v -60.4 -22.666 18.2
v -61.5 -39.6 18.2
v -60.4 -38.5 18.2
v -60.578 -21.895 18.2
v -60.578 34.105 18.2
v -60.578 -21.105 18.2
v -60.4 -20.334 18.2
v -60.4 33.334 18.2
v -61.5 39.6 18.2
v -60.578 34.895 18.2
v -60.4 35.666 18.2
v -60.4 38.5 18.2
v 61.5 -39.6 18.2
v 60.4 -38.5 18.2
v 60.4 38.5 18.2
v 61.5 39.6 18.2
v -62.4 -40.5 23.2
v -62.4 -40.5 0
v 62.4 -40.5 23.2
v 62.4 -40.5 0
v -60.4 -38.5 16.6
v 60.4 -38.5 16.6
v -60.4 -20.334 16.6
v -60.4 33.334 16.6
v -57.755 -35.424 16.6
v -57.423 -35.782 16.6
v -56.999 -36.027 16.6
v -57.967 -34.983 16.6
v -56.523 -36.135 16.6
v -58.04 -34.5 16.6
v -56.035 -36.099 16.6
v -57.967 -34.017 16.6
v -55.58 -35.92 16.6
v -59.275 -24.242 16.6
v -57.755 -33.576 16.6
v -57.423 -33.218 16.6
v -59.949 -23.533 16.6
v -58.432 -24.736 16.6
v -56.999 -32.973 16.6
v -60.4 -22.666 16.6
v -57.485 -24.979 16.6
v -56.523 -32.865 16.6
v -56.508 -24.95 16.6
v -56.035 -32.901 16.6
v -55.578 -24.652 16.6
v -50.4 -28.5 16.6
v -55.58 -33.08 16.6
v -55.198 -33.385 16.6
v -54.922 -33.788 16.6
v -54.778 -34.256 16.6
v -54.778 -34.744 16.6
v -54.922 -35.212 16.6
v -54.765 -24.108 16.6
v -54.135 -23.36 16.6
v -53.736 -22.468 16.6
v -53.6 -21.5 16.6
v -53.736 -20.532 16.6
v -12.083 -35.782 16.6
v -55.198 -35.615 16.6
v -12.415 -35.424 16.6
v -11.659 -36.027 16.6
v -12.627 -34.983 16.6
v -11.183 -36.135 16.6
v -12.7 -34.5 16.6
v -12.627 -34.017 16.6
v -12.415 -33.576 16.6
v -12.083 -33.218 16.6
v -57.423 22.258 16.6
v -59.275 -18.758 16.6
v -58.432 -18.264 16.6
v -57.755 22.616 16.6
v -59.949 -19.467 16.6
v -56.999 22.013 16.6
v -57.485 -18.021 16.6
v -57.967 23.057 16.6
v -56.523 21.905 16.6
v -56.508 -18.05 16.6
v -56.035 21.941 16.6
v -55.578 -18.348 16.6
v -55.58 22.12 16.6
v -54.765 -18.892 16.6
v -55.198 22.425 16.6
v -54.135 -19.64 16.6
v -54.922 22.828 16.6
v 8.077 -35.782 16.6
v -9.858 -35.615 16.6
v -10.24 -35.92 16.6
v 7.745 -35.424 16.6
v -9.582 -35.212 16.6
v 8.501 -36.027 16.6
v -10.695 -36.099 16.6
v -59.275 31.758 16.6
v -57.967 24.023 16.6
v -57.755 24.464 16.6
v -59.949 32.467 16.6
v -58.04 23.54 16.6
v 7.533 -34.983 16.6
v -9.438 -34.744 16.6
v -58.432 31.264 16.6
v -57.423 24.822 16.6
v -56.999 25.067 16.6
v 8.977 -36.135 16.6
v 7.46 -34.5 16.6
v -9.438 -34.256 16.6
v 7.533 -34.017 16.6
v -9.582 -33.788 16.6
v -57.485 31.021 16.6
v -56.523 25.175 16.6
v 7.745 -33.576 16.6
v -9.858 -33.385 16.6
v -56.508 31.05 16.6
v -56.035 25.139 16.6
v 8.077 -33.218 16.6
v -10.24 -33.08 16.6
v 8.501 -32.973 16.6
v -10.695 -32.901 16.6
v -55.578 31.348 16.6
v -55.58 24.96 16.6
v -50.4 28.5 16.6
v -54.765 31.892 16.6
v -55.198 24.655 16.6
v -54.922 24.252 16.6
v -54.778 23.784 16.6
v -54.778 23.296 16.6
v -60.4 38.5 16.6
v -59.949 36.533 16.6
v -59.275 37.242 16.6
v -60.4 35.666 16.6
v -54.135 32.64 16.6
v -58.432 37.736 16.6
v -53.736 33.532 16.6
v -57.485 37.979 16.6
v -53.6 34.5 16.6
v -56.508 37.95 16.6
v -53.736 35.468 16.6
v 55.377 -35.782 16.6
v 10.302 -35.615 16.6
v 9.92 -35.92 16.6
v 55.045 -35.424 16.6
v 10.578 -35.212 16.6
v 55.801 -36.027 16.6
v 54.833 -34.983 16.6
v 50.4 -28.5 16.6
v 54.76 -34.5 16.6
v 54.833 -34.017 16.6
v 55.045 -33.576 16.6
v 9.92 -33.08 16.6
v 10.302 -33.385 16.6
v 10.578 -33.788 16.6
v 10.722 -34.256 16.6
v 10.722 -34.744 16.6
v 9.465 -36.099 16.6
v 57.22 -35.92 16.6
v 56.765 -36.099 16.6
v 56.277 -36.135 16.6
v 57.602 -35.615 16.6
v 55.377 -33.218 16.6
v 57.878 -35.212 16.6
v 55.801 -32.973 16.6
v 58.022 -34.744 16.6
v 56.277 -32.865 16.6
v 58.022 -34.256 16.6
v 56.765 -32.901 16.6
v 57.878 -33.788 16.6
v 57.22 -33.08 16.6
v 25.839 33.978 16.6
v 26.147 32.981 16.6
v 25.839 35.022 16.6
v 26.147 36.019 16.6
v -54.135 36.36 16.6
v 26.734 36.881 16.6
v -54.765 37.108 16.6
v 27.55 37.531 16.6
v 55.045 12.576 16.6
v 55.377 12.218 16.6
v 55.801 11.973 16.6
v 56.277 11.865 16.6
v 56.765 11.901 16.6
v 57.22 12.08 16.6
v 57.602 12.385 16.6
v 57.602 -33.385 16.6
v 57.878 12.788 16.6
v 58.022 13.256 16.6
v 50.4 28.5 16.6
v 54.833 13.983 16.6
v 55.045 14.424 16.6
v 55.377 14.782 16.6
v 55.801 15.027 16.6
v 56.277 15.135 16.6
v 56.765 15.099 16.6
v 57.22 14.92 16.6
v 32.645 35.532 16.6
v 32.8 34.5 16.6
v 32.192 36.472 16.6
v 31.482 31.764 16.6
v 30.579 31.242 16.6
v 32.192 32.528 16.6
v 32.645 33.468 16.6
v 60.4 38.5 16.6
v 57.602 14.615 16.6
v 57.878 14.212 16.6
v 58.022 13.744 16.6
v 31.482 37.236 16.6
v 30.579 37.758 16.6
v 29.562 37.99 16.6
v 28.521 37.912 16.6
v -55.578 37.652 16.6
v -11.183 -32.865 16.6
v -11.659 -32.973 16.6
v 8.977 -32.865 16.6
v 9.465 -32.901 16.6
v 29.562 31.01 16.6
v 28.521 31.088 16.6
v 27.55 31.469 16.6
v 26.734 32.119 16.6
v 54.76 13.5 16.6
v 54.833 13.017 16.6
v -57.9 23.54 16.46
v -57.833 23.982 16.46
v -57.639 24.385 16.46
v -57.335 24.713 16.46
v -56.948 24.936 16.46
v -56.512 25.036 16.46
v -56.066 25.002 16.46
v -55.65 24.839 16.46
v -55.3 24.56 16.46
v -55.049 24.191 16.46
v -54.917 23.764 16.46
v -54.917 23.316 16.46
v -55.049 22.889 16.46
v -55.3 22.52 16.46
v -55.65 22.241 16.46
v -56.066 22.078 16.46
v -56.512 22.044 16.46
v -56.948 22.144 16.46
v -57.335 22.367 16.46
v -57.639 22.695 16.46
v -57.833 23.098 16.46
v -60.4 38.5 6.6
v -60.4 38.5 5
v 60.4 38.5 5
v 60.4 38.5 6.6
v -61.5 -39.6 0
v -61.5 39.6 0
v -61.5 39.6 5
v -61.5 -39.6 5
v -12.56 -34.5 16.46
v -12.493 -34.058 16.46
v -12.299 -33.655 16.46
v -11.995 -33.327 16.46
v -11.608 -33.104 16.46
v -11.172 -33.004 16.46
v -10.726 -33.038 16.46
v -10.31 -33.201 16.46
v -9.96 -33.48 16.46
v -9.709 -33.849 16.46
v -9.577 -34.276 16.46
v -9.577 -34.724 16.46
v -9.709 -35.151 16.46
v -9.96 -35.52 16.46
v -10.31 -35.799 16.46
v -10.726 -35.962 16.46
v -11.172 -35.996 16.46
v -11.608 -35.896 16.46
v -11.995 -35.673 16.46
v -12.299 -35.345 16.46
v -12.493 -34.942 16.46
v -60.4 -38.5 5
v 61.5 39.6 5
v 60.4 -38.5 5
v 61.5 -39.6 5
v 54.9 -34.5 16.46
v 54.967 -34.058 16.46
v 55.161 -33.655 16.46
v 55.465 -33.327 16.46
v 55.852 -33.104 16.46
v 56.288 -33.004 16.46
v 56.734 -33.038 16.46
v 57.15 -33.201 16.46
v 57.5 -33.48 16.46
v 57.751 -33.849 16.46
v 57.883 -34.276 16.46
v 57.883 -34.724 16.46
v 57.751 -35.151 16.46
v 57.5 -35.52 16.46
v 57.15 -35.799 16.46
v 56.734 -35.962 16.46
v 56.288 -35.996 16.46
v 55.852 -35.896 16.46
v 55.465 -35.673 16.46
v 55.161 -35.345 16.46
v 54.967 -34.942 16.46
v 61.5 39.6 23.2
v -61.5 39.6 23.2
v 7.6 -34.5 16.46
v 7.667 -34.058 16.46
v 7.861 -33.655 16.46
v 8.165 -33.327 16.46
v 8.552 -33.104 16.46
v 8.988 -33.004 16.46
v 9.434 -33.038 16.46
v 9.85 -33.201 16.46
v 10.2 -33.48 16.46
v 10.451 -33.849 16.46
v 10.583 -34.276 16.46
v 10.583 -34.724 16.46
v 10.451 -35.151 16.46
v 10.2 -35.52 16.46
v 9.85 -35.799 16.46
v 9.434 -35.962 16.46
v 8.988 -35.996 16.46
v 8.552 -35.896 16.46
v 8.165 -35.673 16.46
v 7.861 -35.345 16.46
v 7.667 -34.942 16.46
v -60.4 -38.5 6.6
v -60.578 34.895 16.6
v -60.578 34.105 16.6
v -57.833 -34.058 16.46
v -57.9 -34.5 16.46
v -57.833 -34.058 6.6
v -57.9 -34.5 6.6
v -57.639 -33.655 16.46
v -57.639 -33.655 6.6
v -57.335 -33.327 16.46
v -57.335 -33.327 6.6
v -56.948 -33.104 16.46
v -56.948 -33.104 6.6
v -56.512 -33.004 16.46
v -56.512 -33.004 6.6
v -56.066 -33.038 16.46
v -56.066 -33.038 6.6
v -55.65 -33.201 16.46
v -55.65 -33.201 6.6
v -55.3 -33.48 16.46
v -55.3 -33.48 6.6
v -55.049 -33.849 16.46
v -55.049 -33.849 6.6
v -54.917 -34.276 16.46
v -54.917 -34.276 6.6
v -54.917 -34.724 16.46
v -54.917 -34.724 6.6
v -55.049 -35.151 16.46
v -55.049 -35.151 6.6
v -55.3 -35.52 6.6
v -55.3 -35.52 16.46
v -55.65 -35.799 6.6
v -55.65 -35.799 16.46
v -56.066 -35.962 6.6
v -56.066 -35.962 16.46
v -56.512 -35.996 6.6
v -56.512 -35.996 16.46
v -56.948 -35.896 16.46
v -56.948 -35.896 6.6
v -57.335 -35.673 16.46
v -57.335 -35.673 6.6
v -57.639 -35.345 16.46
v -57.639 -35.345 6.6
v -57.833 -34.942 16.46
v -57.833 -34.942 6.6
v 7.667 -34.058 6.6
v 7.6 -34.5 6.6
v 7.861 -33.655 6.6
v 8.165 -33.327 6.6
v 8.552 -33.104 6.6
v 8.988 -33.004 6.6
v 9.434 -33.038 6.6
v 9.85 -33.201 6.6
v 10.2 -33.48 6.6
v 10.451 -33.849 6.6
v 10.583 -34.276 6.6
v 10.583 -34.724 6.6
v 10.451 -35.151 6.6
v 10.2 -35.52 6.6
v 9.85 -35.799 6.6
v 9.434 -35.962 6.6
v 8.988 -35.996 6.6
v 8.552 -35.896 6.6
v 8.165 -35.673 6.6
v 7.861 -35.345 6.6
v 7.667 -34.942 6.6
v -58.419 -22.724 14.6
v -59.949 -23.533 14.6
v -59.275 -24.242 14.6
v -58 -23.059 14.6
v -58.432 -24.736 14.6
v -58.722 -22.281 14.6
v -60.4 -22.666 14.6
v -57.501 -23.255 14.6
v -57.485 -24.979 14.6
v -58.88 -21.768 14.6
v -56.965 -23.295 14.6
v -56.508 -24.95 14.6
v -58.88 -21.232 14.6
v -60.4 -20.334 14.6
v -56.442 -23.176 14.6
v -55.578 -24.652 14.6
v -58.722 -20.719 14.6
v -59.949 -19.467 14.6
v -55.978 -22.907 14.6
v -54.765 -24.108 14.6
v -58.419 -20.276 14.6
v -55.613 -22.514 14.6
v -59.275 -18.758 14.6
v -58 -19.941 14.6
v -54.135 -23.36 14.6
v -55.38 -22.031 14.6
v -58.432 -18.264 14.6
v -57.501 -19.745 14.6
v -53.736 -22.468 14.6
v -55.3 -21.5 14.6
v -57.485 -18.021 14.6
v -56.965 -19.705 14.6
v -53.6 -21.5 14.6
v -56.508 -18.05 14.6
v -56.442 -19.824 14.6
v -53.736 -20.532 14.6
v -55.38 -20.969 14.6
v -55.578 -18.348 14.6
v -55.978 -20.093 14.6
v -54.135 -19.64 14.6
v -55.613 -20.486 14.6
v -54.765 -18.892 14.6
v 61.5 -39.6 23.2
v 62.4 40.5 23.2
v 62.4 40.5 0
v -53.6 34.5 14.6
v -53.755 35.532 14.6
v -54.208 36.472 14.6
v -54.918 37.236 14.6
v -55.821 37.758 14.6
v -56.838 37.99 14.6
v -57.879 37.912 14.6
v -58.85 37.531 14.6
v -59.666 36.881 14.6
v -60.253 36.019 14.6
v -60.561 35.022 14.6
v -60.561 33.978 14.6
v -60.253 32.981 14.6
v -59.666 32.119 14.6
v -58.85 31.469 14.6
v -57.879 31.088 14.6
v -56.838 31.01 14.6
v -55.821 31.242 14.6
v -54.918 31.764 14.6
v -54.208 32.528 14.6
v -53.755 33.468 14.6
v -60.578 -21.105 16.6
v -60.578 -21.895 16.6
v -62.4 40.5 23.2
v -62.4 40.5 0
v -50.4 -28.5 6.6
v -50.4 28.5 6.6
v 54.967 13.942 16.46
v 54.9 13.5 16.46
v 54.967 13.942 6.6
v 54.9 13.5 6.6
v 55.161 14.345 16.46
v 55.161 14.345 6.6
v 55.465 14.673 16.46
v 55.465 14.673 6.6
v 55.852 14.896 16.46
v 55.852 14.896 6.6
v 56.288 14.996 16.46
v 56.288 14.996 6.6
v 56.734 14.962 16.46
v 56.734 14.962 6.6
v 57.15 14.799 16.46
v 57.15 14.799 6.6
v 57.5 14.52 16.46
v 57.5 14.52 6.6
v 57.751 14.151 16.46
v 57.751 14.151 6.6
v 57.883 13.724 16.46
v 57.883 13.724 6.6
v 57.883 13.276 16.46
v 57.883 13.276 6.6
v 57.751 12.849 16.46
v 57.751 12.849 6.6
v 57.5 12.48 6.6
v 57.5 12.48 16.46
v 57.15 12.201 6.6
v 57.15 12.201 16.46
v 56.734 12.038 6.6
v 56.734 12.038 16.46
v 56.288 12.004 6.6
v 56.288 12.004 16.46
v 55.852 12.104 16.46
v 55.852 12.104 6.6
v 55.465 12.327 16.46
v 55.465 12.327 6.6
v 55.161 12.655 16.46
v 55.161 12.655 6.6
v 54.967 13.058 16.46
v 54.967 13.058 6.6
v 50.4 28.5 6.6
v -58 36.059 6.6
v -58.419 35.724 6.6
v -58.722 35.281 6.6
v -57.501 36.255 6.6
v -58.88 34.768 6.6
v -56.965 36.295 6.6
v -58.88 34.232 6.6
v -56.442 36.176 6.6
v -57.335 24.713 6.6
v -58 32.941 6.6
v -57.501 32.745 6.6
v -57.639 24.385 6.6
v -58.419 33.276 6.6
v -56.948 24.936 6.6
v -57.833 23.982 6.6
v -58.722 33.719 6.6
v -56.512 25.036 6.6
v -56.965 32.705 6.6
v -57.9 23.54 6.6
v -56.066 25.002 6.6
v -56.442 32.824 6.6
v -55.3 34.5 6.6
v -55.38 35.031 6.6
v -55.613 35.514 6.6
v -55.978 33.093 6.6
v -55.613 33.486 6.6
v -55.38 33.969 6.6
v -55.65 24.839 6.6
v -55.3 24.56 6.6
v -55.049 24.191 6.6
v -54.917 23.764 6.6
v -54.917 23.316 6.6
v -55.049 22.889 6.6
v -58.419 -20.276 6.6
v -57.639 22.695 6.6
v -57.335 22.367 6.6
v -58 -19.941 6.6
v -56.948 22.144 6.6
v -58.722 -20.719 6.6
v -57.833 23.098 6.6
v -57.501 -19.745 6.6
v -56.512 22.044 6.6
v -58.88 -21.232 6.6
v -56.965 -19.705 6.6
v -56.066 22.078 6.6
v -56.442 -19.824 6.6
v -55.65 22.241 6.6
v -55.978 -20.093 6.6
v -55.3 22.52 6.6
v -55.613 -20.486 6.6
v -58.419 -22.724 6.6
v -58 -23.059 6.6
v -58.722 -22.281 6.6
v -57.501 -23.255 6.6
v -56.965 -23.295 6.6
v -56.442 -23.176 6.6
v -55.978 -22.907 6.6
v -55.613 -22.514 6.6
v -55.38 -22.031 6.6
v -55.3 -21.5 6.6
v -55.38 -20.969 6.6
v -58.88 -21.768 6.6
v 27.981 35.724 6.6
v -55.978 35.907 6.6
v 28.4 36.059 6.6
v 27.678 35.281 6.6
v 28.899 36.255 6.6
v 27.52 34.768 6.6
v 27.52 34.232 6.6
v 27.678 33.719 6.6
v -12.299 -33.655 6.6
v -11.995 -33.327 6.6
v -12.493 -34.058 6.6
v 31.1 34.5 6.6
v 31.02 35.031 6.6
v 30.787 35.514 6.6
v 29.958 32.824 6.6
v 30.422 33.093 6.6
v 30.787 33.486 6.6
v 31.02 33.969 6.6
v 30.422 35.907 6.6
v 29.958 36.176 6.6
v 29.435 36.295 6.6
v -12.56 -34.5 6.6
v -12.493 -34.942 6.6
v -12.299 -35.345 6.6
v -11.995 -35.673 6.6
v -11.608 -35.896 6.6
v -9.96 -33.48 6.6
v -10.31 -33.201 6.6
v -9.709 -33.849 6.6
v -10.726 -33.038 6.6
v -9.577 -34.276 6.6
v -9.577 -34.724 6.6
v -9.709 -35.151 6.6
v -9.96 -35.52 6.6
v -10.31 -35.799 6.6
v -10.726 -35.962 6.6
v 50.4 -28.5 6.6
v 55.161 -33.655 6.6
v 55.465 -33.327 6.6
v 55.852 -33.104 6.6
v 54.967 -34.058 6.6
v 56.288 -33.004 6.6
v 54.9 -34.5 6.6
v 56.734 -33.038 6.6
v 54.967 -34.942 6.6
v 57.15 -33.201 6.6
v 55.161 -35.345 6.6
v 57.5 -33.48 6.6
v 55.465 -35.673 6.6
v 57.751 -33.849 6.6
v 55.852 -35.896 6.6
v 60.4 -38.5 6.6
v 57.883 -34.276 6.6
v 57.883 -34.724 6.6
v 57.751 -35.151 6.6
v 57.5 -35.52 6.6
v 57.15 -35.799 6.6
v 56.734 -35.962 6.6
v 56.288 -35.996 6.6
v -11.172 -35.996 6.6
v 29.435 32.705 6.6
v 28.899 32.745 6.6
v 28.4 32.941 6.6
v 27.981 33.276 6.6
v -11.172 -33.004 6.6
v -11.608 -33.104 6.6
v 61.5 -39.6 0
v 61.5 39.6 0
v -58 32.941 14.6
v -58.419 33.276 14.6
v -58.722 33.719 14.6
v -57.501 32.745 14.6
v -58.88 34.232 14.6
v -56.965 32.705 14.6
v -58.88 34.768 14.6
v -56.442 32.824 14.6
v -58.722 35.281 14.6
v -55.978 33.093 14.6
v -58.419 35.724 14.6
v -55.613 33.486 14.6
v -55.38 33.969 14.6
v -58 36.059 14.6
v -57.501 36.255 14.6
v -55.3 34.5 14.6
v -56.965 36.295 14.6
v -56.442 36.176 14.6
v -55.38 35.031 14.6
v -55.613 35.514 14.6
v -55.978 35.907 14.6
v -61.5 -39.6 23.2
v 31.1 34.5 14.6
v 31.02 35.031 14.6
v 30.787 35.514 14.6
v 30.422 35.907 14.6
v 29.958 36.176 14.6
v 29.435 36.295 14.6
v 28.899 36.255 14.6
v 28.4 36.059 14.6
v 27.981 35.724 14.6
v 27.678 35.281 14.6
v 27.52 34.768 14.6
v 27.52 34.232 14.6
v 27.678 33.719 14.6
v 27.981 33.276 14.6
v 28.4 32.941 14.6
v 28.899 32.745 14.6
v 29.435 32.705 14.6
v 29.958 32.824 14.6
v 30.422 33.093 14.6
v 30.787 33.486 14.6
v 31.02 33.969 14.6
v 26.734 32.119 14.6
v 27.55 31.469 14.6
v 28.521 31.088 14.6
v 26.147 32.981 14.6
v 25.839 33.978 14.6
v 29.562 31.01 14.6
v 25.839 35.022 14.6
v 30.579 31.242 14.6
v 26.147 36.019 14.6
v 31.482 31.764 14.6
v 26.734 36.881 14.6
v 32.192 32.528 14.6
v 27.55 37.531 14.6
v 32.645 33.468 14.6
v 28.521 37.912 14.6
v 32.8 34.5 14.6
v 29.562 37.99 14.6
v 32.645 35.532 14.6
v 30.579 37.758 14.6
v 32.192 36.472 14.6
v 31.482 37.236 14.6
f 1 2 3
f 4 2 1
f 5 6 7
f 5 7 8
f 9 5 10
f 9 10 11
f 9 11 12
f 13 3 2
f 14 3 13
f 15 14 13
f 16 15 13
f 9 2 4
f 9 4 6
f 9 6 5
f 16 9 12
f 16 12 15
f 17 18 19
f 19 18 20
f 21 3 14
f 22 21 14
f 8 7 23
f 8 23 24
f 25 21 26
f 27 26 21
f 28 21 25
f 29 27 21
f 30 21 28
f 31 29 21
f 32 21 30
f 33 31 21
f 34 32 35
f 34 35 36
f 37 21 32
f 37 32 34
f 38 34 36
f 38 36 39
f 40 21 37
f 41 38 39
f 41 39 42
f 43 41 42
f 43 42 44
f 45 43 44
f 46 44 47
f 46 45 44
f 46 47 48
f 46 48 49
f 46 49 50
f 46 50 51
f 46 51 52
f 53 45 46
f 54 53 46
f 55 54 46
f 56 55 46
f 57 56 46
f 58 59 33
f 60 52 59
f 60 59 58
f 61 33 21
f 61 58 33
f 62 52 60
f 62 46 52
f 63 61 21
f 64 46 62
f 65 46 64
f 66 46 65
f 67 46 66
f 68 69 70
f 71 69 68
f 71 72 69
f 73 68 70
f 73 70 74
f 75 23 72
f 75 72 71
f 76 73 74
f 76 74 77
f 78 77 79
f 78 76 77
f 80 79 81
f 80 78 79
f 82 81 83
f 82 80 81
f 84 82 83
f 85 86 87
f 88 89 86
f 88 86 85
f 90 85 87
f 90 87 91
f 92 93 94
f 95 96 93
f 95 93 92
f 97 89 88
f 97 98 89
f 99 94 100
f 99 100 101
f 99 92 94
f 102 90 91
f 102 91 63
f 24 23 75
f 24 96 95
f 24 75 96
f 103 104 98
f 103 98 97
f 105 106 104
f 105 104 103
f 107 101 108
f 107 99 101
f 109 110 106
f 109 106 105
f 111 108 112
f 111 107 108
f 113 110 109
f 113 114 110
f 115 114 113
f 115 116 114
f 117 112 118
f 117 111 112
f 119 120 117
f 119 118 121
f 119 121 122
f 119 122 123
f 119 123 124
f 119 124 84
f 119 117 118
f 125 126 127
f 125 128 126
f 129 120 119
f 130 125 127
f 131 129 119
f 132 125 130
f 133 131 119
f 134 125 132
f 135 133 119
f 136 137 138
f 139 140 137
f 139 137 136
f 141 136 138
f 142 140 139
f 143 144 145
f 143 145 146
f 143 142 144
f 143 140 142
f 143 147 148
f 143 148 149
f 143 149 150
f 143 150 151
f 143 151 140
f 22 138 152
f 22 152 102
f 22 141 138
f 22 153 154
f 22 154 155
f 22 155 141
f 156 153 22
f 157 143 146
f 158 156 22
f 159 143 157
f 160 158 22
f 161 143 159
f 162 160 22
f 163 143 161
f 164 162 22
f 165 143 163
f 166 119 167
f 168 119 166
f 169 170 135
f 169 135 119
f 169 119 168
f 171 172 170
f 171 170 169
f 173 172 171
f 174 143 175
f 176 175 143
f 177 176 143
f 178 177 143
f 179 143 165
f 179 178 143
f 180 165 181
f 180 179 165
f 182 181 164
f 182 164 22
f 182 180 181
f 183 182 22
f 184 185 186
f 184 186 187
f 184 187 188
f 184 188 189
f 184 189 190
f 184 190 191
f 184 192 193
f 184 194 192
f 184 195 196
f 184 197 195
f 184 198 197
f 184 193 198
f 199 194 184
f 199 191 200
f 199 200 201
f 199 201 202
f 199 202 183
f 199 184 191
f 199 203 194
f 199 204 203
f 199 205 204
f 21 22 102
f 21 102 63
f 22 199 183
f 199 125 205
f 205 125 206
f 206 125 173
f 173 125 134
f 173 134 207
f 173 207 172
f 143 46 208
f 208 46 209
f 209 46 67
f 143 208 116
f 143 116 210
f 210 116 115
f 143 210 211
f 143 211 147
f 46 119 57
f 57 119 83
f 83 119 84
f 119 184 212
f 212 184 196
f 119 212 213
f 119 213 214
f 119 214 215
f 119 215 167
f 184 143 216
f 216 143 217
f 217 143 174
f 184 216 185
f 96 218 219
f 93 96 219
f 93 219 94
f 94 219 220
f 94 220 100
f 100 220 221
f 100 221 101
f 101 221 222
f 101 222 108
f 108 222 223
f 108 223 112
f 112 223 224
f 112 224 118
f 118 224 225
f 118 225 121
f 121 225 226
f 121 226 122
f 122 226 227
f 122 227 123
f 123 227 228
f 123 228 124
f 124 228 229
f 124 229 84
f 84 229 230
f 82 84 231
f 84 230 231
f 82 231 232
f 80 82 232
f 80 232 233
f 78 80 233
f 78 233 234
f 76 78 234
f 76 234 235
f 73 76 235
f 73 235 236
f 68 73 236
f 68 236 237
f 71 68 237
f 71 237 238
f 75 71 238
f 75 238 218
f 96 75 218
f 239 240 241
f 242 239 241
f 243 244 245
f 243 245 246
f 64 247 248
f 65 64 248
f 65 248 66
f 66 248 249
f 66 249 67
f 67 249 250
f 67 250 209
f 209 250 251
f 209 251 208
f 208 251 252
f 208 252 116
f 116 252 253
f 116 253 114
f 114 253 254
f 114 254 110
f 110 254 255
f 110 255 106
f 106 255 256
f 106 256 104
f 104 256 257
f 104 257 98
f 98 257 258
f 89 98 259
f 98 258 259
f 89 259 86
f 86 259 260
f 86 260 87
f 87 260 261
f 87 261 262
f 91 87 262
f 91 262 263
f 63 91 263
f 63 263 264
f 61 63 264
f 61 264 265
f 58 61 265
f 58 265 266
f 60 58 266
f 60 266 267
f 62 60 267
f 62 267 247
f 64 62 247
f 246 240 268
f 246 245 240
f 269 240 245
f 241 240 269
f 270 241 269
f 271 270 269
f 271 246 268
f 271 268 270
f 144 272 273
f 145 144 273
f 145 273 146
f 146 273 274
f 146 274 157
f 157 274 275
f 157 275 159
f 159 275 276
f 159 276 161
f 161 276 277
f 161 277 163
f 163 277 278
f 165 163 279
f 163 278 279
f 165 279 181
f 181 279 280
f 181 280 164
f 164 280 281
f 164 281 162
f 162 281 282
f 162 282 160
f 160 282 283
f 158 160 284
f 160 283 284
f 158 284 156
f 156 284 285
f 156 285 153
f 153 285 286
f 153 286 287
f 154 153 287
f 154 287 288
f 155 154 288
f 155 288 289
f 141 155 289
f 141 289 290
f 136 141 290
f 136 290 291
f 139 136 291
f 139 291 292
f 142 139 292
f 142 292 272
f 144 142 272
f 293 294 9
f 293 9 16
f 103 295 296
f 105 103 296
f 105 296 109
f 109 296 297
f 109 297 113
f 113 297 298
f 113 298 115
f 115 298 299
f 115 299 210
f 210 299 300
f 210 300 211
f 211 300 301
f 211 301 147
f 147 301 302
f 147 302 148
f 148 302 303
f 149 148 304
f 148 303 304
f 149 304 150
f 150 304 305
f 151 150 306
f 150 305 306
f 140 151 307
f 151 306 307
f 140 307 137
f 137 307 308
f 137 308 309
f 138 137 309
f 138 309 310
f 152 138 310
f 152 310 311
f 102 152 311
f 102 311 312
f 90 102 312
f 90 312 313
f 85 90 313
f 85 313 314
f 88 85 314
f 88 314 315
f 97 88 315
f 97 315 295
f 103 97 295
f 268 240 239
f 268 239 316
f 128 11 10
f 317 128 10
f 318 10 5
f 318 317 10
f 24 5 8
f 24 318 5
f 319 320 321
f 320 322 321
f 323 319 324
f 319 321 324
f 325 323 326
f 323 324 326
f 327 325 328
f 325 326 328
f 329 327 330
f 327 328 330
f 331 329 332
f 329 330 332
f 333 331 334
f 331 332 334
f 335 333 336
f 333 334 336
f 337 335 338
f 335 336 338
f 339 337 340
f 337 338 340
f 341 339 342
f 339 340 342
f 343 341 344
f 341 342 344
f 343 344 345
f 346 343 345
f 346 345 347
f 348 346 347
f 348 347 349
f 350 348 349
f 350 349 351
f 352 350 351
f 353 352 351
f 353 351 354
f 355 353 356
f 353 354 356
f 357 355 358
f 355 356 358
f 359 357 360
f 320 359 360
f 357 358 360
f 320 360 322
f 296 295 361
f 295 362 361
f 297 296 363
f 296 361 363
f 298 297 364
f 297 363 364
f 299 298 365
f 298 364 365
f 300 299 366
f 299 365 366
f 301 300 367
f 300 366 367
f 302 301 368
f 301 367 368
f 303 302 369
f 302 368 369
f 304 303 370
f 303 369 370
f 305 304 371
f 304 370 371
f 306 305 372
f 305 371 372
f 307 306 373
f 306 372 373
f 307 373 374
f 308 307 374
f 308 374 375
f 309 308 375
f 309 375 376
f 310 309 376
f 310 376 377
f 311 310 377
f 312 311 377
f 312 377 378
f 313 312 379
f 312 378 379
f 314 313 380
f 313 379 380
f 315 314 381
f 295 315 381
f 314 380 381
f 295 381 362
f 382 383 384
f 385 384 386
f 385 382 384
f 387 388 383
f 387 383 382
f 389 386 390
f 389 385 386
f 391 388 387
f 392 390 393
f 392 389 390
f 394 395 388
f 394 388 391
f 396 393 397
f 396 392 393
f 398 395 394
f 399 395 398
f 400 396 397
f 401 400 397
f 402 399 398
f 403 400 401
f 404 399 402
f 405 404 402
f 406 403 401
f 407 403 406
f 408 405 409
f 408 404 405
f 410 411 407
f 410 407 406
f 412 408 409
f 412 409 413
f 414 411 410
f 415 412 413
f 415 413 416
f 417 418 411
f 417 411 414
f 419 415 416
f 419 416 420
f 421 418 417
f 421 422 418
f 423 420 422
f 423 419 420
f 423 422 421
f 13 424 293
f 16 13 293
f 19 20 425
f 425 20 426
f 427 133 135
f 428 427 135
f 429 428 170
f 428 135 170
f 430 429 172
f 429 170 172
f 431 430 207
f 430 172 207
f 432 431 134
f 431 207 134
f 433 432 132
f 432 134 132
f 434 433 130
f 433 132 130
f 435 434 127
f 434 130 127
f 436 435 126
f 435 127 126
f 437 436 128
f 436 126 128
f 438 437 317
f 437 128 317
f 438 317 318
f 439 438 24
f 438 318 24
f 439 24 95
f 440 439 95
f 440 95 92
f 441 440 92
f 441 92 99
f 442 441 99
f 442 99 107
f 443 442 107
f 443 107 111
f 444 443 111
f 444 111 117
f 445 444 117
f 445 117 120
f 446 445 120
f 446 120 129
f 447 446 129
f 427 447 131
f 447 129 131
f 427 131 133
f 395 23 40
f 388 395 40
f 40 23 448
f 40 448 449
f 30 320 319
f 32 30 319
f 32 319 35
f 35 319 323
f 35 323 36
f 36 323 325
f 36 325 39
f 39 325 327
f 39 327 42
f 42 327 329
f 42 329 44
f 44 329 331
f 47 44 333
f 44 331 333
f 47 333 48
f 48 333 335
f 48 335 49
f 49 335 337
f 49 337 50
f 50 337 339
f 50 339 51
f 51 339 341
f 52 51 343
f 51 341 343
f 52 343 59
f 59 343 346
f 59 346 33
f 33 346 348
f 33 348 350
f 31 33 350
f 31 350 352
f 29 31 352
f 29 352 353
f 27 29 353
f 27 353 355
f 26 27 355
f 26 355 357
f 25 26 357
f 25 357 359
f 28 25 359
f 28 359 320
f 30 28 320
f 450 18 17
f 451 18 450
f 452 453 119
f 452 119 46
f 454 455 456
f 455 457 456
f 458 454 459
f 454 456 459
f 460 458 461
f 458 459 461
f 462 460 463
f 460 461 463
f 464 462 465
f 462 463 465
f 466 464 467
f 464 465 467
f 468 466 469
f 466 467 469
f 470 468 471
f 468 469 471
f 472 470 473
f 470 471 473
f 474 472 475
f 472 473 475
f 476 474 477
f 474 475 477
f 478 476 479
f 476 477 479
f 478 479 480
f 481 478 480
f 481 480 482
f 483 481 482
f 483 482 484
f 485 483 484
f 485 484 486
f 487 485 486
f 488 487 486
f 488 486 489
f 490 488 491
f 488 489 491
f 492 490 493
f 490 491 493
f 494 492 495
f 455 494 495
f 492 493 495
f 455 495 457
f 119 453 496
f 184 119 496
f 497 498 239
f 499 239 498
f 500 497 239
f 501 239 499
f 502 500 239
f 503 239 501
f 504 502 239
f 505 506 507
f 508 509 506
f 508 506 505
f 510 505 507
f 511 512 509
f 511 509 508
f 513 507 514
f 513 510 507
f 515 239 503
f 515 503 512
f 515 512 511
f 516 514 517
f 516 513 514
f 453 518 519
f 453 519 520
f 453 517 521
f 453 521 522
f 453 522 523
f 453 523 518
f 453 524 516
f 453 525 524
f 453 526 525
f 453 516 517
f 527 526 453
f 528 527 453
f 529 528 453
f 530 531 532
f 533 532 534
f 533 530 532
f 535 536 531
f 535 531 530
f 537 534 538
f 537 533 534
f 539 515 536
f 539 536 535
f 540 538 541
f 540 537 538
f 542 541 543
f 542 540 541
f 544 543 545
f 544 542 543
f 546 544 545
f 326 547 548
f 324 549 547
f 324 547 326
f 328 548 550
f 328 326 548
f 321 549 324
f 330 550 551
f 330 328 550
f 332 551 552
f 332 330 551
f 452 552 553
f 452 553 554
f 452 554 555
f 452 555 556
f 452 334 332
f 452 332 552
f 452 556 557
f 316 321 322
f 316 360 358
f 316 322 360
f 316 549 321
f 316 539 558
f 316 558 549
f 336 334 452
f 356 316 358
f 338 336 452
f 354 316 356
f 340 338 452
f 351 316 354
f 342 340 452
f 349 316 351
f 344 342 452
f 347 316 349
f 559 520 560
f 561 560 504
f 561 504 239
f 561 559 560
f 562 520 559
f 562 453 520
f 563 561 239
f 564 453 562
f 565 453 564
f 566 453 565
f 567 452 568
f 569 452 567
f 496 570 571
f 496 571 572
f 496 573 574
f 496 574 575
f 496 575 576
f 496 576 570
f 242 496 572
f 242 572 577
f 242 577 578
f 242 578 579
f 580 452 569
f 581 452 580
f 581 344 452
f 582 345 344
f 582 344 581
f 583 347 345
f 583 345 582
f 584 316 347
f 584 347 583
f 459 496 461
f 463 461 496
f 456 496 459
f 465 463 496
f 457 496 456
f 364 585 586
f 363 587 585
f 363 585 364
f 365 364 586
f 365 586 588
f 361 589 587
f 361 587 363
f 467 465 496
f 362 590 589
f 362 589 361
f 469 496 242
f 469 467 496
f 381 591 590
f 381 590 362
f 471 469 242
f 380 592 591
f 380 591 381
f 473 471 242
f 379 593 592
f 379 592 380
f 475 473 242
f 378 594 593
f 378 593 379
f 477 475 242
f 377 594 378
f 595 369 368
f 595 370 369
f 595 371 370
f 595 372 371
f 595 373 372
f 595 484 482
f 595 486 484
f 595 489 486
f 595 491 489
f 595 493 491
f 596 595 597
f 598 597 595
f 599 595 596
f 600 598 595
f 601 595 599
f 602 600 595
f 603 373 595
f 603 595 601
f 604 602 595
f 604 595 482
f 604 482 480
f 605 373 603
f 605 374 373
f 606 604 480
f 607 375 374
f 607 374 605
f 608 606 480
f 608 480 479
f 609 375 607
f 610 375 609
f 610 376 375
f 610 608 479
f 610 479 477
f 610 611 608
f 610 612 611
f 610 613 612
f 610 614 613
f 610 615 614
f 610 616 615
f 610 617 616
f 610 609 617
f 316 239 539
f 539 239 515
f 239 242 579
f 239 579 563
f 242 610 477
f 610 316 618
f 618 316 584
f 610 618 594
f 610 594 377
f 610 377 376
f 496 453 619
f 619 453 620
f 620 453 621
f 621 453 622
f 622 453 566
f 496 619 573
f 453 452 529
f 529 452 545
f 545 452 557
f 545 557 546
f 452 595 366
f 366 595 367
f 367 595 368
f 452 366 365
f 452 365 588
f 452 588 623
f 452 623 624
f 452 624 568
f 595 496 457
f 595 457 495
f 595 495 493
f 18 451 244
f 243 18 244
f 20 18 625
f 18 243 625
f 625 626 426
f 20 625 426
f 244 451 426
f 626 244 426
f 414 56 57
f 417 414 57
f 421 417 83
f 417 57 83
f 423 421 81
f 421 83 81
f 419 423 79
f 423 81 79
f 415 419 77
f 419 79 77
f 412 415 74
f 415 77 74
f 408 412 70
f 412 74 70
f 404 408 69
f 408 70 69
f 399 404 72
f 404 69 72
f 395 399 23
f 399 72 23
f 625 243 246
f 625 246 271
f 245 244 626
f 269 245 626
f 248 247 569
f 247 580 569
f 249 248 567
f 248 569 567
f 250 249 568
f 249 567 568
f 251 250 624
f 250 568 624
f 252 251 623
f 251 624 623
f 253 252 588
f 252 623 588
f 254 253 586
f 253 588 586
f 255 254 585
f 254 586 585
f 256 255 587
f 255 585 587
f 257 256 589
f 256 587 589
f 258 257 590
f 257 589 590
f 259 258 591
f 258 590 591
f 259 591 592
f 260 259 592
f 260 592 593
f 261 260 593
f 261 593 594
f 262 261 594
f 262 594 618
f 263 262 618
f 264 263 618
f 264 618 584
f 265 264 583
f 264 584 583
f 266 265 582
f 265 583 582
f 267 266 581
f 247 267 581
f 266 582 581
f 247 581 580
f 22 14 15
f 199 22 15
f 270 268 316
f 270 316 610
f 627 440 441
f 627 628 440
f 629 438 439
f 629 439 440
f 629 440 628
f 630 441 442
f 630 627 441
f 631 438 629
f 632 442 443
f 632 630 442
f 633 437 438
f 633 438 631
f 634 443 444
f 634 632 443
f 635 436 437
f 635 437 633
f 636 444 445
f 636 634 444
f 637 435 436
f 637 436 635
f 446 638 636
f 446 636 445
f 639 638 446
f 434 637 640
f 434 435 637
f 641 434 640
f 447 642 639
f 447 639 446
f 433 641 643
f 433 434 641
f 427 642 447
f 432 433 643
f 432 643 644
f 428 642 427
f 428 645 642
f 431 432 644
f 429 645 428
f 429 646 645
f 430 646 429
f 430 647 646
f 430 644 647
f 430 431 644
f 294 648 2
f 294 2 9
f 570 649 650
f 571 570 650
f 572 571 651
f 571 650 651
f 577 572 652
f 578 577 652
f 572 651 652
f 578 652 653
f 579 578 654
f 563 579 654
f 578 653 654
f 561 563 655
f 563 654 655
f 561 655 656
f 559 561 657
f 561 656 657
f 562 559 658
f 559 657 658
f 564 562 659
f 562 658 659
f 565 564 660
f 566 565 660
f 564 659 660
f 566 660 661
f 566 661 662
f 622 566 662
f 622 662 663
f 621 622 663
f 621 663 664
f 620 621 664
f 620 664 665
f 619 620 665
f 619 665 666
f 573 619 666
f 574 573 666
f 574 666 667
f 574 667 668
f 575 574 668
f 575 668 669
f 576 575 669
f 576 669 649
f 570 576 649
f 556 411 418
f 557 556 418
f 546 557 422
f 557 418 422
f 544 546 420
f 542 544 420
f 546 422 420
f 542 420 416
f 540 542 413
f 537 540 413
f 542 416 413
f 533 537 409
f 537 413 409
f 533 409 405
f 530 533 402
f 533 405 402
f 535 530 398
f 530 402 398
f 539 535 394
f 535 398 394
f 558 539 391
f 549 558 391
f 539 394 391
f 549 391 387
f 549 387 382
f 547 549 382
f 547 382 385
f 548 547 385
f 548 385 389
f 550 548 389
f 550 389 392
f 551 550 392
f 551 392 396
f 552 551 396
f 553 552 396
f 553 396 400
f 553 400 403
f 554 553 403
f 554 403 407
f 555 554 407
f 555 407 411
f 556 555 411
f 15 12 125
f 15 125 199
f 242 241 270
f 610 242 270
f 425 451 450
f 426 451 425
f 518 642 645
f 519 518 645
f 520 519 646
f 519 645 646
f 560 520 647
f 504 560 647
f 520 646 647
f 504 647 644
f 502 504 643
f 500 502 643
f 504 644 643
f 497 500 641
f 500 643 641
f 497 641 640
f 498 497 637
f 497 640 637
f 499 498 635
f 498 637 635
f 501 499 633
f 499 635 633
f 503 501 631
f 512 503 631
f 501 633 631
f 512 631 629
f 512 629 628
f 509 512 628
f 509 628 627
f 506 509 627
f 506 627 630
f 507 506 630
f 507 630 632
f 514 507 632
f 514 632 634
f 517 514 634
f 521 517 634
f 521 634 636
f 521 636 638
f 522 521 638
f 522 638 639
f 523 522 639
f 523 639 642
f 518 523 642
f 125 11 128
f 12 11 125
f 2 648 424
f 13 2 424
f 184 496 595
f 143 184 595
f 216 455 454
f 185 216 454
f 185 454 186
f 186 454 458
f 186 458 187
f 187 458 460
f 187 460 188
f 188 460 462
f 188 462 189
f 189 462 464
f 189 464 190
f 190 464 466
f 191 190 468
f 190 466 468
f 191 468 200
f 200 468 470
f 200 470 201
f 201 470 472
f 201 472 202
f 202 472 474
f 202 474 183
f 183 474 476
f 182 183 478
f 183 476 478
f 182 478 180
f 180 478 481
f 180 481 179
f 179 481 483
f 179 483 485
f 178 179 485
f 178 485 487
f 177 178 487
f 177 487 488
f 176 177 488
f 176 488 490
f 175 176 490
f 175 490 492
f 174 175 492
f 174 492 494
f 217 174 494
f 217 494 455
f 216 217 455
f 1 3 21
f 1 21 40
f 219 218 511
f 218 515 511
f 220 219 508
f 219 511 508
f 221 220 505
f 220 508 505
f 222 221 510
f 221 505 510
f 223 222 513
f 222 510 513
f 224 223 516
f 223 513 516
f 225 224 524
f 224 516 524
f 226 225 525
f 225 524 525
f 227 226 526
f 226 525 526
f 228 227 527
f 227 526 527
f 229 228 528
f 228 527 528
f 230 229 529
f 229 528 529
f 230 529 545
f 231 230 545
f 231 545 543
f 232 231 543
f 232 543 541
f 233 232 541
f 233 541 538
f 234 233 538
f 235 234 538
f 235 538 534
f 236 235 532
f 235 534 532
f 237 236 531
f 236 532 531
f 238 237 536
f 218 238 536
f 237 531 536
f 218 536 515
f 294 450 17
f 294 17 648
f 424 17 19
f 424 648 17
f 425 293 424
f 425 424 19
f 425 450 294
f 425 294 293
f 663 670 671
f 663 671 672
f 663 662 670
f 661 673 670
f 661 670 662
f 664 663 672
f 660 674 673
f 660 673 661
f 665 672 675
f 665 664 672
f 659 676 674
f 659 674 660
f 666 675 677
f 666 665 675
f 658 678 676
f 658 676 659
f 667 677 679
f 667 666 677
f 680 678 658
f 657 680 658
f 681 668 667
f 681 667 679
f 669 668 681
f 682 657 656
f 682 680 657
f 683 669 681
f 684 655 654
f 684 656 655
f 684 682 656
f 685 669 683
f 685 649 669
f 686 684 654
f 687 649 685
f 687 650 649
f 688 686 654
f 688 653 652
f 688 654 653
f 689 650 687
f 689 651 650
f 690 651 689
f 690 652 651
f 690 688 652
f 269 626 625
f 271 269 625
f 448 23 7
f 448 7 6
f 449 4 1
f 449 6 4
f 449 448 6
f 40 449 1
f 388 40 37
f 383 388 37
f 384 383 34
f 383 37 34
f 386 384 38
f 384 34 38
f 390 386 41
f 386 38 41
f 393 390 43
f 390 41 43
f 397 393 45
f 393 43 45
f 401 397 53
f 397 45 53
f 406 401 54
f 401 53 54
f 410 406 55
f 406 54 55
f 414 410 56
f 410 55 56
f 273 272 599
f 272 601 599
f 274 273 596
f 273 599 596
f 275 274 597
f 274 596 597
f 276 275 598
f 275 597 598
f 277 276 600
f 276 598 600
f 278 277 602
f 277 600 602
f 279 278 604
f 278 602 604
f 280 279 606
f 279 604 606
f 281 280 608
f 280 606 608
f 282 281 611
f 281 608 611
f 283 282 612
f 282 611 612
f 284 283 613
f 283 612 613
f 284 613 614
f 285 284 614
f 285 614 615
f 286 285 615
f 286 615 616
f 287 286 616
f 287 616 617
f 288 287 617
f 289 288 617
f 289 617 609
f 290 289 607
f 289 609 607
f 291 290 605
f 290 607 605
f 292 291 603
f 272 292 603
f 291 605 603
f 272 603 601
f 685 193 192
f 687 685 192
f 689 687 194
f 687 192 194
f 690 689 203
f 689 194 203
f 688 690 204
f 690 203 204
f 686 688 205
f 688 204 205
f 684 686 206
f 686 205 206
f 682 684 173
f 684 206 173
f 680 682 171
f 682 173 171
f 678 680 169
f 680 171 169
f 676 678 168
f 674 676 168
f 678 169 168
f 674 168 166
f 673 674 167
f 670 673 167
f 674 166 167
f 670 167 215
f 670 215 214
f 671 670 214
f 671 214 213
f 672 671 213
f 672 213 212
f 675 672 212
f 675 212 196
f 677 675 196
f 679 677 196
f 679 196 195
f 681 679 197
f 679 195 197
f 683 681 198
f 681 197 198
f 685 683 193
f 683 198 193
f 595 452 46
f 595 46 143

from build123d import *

# Parameters (mm, degrees)
F0_W            = 124.8
F0_H            = 81
F1_DEPTH        = 23.2
F2_W            = 123
F2_H            = 79.2
F3_DEPTH        = 5
F4_W            = 123
F4_H            = 79.2
F5_DEPTH        = 5
F6_W            = 120.8
F6_H            = 77
F7_DEPTH        = 1.6
F8_W            = 120.8
F8_H            = 77
F9_DEPTH        = 1.6
F10_W           = 100.8
F10_H           = 57
F11_DEPTH       = 16.601
F13_R           = 3.5
F14_DEPTH       = 6.601
F15_DEPTH       = 2
F12_R           = 1.8
F16_DEPTH       = 16.601
F17_R           = 1.8
F19_DEPTH       = 16.601
F18_R           = 3.5
F20_DEPTH       = 2
F21_R           = 1.8
F23_DEPTH       = 16.601
F22_R           = 1.8
F24_DEPTH       = 2
F22_R_2         = 3.5
F25_DEPTH       = 25
F27_D           = 3
F27_CSINK_D     = 3.28
F27_CSINK_ANGLE = 90


with BuildPart() as f1:
    # F0 (on Top) → F1 (new body)
    with BuildSketch(Plane.XY):
        Rectangle(F0_W, F0_H)
    extrude(amount=F1_DEPTH)

    # F2 (on face) → F3 (cut)
    with BuildSketch(Plane.XY.offset(23.2)):
        Rectangle(F2_W, F2_H)
    extrude(amount=-F3_DEPTH, mode=Mode.SUBTRACT)

    # F4 (on face) → F5 (cut)
    with BuildSketch(Plane(origin=(0, 0, 0), x_dir=(1, 0, 0), z_dir=(0, 0, -1))):
        Rectangle(F4_W, F4_H)
    extrude(amount=-F5_DEPTH, mode=Mode.SUBTRACT)

    # F6 (on face) → F7 (cut)
    with BuildSketch(Plane.XY.offset(18.2)):
        Rectangle(F6_W, F6_H)
    extrude(amount=-F7_DEPTH, mode=Mode.SUBTRACT)

    # F8 (on face) → F9 (cut)
    with BuildSketch(Plane(origin=(0, 0, 5), x_dir=(1, 0, 0), z_dir=(0, 0, -1))):
        Rectangle(F8_W, F8_H)
    extrude(amount=-F9_DEPTH, mode=Mode.SUBTRACT)

    # F10 (on face) → F11 (cut, through all)
    with BuildSketch(Plane(origin=(0, 0, 6.6), x_dir=(1, 0, 0), z_dir=(0, 0, -1))):
        Rectangle(F10_W, F10_H)
    extrude(amount=-F11_DEPTH, mode=Mode.SUBTRACT)

    # F13 (on face) → F14 (cut, through all)
    with BuildSketch(Plane.XY.offset(16.6)):
        with Locations((-57.1, 34.5)):
            Circle(F13_R)
    extrude(amount=F14_DEPTH, mode=Mode.SUBTRACT)

    # F13 (on face) → F15 (cut)
    with BuildSketch(Plane.XY.offset(16.6)):
        with Locations((-57.1, 34.5)):
            Circle(F13_R)
    extrude(amount=-F15_DEPTH, mode=Mode.SUBTRACT)

    # F12 (on face) → F16 (cut, through all)
    with BuildSketch(Plane.XY.offset(16.6)):
        with Locations((-57.1, 34.5)):
            Circle(F12_R)
    extrude(amount=-F16_DEPTH, mode=Mode.SUBTRACT)

    # F17 (on face) → F19 (cut, through all)
    with BuildSketch(Plane.XY.offset(16.6)):
        with Locations((29.3, 34.5)):
            Circle(F17_R)
    extrude(amount=-F19_DEPTH, mode=Mode.SUBTRACT)

    # F18 (on face) → F20 (cut)
    with BuildSketch(Plane.XY.offset(16.6)):
        with Locations((29.3, 34.5)):
            Circle(F18_R)
    extrude(amount=-F20_DEPTH, mode=Mode.SUBTRACT)

    # F21 (on face) → F23 (cut, through all)
    with BuildSketch(Plane.XY.offset(16.6)):
        with Locations((-57.1, -21.5)):
            Circle(F21_R)
    extrude(amount=-F23_DEPTH, mode=Mode.SUBTRACT)

    # F22 (on face) → F24 (cut)
    with BuildSketch(Plane.XY.offset(16.6)):
        with BuildLine():
            ThreePointArc((-60.4, -22.666190379), (-56.5083920217, -24.9496376621), (-53.6, -21.5))
            ThreePointArc((-53.6, -21.5), (-56.5083920217, -18.0503623379), (-60.4, -20.333809621))
            Line((-60.4, -20.333809621), (-60.4, -22.666190379))
        make_face()
        with Locations((-57.1, -21.5)):
            Circle(F22_R, mode=Mode.SUBTRACT)
    extrude(amount=-F24_DEPTH, mode=Mode.SUBTRACT)

    # F22 (on face) → F25 (cut)
    with BuildSketch(Plane.XY.offset(16.6)):
        with Locations((-57.1, -21.5)):
            Circle(F22_R_2)
    extrude(amount=F25_DEPTH, mode=Mode.SUBTRACT)

    # F27 (through all)
    with Locations(Plane.XY.offset(16.6)):
        with Locations((56.4, 13.5), (56.4, -34.5), (9.1, -34.5), (-11.06, -34.5), (-56.4, -34.5), (-56.4, 23.54)):
            CounterSinkHole(F27_D / 2, F27_CSINK_D / 2, counter_sink_angle=F27_CSINK_ANGLE)


solid = f1.part
